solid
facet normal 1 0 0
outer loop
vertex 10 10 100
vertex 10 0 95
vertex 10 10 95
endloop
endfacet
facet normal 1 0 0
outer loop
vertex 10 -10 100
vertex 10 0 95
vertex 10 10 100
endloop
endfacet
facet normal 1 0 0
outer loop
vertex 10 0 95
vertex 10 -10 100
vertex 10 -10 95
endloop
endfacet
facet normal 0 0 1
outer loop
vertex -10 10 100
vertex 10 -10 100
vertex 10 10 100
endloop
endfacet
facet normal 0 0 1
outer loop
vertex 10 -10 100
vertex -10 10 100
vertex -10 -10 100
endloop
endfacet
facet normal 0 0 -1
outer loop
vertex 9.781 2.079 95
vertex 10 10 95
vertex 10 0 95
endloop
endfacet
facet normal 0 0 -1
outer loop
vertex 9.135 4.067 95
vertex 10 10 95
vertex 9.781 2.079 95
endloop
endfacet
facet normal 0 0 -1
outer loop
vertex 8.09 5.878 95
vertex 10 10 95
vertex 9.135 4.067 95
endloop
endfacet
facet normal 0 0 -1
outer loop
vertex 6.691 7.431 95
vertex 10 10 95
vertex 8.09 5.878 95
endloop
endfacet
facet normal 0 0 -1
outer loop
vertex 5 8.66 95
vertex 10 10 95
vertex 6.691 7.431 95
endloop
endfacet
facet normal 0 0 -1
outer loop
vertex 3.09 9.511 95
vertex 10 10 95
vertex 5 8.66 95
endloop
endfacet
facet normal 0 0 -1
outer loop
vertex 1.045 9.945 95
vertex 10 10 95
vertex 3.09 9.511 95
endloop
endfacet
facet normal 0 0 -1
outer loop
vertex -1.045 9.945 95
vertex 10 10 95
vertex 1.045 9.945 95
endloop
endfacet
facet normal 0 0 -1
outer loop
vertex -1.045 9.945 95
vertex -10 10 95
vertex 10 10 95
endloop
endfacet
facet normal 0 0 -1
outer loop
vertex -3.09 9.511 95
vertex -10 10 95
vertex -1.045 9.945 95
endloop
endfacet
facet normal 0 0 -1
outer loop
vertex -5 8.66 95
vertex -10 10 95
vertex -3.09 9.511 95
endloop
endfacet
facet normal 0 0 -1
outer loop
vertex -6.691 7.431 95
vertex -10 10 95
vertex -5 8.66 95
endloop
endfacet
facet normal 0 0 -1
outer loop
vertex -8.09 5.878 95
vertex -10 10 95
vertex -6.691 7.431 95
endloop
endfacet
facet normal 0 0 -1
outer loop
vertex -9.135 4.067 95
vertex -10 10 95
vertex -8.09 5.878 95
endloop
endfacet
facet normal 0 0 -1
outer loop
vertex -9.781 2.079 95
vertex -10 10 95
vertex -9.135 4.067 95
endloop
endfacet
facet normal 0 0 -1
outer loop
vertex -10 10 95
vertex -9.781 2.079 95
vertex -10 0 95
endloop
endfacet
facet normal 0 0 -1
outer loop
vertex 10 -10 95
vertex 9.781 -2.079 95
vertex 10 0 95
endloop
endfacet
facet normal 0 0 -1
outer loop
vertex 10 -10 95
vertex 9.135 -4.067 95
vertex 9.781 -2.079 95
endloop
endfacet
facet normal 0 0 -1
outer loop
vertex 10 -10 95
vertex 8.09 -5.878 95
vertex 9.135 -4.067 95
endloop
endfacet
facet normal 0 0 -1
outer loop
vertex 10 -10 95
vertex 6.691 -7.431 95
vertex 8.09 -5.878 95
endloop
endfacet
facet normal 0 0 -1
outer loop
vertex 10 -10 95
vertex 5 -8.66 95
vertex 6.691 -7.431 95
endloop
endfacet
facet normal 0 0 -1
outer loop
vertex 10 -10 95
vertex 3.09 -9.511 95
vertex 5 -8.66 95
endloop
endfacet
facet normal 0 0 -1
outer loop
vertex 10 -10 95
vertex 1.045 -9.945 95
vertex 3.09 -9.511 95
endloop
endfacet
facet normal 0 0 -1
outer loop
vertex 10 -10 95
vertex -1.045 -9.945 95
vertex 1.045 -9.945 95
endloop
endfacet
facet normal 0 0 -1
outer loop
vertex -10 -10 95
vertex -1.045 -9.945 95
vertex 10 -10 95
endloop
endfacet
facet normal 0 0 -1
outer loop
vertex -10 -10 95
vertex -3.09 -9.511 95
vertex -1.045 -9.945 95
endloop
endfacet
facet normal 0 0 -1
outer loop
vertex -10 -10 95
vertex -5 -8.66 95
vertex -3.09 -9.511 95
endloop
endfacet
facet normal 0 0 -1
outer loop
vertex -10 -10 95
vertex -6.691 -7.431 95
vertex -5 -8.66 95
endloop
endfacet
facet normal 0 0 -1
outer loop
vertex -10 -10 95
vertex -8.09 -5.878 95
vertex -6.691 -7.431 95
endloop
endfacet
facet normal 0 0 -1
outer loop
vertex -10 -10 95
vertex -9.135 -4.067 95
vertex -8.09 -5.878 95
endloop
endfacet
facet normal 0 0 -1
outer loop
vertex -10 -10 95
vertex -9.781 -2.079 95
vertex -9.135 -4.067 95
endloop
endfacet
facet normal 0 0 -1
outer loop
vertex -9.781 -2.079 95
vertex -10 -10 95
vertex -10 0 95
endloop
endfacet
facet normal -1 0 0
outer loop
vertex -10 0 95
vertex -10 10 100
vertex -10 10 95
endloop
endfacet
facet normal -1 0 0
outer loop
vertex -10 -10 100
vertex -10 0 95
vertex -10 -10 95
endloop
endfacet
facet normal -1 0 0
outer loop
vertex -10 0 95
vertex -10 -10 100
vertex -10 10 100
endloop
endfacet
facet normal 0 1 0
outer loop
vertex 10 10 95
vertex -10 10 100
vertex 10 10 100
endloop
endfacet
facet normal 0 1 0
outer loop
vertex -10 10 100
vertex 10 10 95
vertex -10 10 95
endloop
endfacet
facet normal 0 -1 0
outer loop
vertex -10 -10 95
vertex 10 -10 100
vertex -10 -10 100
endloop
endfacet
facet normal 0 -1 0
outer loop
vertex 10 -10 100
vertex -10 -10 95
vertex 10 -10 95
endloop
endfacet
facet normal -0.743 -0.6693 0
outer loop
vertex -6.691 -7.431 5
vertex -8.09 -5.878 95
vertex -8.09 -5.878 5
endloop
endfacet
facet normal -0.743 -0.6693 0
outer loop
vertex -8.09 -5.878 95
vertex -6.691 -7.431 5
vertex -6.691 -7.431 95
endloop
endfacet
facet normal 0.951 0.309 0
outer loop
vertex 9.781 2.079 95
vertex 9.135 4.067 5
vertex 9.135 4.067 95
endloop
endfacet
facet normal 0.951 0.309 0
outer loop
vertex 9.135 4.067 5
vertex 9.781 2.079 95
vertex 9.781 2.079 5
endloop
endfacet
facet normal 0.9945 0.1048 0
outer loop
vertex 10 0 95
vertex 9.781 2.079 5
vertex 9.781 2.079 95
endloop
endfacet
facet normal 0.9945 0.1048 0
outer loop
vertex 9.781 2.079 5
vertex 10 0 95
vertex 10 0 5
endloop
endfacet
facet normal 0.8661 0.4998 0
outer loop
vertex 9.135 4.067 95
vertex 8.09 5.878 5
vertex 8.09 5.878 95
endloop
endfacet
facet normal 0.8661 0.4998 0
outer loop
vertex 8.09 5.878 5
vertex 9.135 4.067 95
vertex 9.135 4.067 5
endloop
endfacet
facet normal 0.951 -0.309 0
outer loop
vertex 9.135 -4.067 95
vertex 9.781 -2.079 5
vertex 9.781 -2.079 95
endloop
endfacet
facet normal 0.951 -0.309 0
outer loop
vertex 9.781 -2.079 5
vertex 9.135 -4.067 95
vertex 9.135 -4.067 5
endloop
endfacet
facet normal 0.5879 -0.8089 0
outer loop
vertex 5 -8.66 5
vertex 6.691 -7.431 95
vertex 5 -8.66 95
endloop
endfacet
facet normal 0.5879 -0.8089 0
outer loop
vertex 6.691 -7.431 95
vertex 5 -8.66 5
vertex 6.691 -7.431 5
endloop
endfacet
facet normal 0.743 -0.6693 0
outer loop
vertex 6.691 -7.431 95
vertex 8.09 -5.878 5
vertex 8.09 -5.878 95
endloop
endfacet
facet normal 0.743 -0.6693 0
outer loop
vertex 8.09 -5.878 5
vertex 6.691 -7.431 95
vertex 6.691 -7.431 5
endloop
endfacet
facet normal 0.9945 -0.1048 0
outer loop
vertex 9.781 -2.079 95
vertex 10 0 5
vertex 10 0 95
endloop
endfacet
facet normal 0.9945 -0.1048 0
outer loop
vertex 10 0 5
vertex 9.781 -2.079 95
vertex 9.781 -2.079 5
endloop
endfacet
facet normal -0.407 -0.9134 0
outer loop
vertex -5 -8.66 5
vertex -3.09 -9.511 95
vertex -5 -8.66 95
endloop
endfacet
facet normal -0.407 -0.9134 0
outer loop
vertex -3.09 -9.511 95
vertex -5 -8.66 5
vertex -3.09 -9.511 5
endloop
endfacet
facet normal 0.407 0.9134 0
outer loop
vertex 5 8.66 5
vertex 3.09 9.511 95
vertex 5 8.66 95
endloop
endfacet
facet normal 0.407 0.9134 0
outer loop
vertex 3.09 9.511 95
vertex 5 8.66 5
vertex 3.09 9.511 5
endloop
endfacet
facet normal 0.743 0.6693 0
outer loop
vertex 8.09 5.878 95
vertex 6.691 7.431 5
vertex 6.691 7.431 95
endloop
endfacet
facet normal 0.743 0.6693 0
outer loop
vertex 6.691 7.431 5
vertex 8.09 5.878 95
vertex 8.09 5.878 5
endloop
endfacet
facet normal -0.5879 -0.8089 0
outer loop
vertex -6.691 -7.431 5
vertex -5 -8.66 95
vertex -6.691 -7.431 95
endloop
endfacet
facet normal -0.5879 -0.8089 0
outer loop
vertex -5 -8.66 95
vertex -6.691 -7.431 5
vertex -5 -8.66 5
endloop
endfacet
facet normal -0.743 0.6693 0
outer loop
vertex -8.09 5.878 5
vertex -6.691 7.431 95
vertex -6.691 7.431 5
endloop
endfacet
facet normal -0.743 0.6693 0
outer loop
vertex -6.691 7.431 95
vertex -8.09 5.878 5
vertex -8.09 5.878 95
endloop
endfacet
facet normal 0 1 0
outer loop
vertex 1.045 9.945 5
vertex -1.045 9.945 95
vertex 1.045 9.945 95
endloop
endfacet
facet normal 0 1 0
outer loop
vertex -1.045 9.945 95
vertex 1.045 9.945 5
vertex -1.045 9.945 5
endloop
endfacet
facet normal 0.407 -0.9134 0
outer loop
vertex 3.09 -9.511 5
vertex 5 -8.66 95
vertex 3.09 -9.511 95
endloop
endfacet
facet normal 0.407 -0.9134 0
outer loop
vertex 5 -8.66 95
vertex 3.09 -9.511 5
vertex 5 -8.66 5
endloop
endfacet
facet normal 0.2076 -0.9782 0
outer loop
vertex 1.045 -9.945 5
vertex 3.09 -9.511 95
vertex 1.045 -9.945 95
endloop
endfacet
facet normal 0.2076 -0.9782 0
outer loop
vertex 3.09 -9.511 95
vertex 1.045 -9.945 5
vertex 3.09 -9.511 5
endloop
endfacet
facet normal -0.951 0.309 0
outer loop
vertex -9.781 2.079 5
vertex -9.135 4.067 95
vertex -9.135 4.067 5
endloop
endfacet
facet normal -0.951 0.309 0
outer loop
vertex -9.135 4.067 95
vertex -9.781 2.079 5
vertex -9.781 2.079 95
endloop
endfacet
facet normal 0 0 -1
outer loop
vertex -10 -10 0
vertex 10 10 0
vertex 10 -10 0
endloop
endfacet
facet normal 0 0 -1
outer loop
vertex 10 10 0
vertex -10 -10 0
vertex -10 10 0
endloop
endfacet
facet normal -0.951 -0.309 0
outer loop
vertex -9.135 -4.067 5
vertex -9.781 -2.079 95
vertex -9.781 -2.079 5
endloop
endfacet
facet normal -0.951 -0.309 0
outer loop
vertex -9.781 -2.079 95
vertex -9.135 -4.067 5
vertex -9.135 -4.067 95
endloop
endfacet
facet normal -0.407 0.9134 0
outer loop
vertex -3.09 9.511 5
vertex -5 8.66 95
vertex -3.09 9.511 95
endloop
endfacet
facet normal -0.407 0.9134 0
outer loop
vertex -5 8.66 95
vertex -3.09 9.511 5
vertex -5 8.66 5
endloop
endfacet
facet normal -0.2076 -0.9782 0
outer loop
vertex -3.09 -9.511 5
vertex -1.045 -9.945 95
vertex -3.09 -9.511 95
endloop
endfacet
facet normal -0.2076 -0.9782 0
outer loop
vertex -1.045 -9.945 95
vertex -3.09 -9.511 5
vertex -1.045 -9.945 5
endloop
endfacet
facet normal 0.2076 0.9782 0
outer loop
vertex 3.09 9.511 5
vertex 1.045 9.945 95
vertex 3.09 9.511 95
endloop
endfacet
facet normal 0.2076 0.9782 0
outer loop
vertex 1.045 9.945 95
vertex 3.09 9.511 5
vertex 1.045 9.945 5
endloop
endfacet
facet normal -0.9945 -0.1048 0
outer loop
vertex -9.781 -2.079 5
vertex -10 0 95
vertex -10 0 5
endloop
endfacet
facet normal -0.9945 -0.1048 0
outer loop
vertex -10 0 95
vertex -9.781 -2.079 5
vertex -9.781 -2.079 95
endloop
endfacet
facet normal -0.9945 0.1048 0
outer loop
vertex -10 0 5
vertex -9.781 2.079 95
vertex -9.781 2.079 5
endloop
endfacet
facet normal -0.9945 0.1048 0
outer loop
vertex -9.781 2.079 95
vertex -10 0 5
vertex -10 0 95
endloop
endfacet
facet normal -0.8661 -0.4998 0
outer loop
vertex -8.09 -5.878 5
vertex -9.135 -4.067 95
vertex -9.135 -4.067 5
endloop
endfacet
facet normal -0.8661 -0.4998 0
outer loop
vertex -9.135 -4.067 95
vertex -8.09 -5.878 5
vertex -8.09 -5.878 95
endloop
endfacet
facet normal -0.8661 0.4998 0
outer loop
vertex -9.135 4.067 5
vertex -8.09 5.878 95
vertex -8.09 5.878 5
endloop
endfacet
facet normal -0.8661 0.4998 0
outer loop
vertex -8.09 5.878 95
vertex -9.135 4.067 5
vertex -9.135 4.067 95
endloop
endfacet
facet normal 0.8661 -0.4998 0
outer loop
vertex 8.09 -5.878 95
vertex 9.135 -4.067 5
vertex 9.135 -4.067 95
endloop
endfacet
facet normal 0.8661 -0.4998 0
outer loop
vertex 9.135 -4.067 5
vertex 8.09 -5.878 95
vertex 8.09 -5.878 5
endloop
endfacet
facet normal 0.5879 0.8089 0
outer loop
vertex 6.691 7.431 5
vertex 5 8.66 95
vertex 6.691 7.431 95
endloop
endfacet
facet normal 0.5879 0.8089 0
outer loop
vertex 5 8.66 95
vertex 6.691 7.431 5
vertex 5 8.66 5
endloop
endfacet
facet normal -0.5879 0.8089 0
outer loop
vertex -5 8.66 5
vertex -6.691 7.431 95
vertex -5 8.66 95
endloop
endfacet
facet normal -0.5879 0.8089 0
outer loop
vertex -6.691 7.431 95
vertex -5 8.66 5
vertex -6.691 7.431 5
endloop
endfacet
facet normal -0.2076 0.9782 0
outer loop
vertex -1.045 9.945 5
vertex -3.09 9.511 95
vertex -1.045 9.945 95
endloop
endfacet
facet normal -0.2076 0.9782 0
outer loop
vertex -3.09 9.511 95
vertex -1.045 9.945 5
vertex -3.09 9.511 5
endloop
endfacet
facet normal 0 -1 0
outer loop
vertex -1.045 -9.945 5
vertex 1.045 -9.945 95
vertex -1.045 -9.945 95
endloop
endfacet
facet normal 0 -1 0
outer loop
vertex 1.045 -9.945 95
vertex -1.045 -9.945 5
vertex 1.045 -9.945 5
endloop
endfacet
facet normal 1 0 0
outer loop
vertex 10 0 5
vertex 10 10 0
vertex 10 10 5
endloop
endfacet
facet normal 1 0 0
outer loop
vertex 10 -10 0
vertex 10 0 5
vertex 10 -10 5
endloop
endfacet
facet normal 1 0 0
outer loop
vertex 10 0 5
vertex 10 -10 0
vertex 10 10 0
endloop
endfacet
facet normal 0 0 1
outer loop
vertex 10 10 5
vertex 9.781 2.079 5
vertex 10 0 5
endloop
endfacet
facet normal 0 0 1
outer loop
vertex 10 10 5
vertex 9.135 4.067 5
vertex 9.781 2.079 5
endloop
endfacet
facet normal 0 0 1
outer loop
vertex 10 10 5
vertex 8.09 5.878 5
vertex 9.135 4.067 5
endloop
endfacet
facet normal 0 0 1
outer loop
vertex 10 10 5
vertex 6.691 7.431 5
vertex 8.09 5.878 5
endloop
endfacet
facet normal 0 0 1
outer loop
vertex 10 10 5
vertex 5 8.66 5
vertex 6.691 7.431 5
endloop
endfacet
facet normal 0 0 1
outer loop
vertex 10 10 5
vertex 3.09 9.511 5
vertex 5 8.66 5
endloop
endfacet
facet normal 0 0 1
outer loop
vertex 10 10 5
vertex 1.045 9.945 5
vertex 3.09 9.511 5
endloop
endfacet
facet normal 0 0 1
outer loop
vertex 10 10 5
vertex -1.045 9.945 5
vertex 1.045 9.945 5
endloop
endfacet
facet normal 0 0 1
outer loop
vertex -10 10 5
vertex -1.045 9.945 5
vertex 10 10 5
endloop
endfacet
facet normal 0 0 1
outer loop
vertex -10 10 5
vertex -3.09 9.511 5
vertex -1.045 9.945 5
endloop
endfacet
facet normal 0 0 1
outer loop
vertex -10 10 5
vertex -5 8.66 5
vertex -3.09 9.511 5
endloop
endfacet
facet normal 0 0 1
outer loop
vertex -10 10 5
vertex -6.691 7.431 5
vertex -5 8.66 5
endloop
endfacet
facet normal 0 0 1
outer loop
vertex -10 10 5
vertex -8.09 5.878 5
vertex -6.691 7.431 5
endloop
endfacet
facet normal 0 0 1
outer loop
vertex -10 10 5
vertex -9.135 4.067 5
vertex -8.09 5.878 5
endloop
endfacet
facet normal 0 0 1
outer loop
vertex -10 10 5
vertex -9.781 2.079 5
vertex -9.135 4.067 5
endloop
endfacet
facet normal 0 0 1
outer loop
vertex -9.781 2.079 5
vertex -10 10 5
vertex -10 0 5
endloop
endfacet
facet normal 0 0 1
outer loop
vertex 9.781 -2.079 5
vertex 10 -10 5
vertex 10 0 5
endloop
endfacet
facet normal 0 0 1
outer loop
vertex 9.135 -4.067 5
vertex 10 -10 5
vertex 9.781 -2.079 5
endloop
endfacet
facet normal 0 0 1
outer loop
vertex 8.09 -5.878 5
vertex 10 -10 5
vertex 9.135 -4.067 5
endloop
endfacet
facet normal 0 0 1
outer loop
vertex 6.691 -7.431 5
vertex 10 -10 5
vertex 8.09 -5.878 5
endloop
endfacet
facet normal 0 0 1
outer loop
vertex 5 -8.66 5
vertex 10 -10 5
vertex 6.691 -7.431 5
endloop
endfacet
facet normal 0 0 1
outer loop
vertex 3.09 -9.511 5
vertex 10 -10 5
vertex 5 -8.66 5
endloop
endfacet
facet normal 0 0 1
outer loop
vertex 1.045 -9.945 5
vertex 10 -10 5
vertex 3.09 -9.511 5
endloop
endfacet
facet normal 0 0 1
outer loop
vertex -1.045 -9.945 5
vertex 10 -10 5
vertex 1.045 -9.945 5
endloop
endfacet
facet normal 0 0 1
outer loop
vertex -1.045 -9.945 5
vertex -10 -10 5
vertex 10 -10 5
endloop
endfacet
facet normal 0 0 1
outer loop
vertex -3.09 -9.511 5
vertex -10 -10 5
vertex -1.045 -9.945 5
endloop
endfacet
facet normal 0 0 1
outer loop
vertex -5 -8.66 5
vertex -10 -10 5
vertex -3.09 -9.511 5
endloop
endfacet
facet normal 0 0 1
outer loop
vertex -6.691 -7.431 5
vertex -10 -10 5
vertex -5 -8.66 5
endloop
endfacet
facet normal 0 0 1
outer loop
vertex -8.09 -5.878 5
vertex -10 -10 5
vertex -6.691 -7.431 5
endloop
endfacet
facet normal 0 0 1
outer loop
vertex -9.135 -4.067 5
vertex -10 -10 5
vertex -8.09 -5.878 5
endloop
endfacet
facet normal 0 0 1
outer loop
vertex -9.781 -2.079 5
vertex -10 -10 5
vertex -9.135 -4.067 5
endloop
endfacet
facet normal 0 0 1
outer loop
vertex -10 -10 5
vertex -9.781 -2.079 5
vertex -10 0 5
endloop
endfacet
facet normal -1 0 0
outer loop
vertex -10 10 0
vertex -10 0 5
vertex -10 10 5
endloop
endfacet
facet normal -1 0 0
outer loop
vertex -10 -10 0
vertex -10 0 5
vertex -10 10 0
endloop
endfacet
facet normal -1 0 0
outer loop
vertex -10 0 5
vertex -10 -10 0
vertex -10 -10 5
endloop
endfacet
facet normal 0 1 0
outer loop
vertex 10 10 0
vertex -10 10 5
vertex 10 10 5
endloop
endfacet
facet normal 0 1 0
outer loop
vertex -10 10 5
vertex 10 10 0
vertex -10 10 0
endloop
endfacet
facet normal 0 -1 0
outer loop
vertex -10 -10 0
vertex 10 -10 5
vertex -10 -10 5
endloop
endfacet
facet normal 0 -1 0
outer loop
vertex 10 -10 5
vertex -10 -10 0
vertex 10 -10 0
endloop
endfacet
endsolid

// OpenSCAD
//column.scad v5
 
color("white") column(100, 20);
 
 module column(height, width){
    radius = 0.5*width;
     
    translate([-radius, -radius,0.95*height]) 
        cube([2*radius,2*radius,.05*height]);
    cylinder(h=height, r1=radius, r2=radius);
    translate([-radius, -radius,0]) 
        cube([2*radius,2*radius,.05*height]);
 }

  
 
